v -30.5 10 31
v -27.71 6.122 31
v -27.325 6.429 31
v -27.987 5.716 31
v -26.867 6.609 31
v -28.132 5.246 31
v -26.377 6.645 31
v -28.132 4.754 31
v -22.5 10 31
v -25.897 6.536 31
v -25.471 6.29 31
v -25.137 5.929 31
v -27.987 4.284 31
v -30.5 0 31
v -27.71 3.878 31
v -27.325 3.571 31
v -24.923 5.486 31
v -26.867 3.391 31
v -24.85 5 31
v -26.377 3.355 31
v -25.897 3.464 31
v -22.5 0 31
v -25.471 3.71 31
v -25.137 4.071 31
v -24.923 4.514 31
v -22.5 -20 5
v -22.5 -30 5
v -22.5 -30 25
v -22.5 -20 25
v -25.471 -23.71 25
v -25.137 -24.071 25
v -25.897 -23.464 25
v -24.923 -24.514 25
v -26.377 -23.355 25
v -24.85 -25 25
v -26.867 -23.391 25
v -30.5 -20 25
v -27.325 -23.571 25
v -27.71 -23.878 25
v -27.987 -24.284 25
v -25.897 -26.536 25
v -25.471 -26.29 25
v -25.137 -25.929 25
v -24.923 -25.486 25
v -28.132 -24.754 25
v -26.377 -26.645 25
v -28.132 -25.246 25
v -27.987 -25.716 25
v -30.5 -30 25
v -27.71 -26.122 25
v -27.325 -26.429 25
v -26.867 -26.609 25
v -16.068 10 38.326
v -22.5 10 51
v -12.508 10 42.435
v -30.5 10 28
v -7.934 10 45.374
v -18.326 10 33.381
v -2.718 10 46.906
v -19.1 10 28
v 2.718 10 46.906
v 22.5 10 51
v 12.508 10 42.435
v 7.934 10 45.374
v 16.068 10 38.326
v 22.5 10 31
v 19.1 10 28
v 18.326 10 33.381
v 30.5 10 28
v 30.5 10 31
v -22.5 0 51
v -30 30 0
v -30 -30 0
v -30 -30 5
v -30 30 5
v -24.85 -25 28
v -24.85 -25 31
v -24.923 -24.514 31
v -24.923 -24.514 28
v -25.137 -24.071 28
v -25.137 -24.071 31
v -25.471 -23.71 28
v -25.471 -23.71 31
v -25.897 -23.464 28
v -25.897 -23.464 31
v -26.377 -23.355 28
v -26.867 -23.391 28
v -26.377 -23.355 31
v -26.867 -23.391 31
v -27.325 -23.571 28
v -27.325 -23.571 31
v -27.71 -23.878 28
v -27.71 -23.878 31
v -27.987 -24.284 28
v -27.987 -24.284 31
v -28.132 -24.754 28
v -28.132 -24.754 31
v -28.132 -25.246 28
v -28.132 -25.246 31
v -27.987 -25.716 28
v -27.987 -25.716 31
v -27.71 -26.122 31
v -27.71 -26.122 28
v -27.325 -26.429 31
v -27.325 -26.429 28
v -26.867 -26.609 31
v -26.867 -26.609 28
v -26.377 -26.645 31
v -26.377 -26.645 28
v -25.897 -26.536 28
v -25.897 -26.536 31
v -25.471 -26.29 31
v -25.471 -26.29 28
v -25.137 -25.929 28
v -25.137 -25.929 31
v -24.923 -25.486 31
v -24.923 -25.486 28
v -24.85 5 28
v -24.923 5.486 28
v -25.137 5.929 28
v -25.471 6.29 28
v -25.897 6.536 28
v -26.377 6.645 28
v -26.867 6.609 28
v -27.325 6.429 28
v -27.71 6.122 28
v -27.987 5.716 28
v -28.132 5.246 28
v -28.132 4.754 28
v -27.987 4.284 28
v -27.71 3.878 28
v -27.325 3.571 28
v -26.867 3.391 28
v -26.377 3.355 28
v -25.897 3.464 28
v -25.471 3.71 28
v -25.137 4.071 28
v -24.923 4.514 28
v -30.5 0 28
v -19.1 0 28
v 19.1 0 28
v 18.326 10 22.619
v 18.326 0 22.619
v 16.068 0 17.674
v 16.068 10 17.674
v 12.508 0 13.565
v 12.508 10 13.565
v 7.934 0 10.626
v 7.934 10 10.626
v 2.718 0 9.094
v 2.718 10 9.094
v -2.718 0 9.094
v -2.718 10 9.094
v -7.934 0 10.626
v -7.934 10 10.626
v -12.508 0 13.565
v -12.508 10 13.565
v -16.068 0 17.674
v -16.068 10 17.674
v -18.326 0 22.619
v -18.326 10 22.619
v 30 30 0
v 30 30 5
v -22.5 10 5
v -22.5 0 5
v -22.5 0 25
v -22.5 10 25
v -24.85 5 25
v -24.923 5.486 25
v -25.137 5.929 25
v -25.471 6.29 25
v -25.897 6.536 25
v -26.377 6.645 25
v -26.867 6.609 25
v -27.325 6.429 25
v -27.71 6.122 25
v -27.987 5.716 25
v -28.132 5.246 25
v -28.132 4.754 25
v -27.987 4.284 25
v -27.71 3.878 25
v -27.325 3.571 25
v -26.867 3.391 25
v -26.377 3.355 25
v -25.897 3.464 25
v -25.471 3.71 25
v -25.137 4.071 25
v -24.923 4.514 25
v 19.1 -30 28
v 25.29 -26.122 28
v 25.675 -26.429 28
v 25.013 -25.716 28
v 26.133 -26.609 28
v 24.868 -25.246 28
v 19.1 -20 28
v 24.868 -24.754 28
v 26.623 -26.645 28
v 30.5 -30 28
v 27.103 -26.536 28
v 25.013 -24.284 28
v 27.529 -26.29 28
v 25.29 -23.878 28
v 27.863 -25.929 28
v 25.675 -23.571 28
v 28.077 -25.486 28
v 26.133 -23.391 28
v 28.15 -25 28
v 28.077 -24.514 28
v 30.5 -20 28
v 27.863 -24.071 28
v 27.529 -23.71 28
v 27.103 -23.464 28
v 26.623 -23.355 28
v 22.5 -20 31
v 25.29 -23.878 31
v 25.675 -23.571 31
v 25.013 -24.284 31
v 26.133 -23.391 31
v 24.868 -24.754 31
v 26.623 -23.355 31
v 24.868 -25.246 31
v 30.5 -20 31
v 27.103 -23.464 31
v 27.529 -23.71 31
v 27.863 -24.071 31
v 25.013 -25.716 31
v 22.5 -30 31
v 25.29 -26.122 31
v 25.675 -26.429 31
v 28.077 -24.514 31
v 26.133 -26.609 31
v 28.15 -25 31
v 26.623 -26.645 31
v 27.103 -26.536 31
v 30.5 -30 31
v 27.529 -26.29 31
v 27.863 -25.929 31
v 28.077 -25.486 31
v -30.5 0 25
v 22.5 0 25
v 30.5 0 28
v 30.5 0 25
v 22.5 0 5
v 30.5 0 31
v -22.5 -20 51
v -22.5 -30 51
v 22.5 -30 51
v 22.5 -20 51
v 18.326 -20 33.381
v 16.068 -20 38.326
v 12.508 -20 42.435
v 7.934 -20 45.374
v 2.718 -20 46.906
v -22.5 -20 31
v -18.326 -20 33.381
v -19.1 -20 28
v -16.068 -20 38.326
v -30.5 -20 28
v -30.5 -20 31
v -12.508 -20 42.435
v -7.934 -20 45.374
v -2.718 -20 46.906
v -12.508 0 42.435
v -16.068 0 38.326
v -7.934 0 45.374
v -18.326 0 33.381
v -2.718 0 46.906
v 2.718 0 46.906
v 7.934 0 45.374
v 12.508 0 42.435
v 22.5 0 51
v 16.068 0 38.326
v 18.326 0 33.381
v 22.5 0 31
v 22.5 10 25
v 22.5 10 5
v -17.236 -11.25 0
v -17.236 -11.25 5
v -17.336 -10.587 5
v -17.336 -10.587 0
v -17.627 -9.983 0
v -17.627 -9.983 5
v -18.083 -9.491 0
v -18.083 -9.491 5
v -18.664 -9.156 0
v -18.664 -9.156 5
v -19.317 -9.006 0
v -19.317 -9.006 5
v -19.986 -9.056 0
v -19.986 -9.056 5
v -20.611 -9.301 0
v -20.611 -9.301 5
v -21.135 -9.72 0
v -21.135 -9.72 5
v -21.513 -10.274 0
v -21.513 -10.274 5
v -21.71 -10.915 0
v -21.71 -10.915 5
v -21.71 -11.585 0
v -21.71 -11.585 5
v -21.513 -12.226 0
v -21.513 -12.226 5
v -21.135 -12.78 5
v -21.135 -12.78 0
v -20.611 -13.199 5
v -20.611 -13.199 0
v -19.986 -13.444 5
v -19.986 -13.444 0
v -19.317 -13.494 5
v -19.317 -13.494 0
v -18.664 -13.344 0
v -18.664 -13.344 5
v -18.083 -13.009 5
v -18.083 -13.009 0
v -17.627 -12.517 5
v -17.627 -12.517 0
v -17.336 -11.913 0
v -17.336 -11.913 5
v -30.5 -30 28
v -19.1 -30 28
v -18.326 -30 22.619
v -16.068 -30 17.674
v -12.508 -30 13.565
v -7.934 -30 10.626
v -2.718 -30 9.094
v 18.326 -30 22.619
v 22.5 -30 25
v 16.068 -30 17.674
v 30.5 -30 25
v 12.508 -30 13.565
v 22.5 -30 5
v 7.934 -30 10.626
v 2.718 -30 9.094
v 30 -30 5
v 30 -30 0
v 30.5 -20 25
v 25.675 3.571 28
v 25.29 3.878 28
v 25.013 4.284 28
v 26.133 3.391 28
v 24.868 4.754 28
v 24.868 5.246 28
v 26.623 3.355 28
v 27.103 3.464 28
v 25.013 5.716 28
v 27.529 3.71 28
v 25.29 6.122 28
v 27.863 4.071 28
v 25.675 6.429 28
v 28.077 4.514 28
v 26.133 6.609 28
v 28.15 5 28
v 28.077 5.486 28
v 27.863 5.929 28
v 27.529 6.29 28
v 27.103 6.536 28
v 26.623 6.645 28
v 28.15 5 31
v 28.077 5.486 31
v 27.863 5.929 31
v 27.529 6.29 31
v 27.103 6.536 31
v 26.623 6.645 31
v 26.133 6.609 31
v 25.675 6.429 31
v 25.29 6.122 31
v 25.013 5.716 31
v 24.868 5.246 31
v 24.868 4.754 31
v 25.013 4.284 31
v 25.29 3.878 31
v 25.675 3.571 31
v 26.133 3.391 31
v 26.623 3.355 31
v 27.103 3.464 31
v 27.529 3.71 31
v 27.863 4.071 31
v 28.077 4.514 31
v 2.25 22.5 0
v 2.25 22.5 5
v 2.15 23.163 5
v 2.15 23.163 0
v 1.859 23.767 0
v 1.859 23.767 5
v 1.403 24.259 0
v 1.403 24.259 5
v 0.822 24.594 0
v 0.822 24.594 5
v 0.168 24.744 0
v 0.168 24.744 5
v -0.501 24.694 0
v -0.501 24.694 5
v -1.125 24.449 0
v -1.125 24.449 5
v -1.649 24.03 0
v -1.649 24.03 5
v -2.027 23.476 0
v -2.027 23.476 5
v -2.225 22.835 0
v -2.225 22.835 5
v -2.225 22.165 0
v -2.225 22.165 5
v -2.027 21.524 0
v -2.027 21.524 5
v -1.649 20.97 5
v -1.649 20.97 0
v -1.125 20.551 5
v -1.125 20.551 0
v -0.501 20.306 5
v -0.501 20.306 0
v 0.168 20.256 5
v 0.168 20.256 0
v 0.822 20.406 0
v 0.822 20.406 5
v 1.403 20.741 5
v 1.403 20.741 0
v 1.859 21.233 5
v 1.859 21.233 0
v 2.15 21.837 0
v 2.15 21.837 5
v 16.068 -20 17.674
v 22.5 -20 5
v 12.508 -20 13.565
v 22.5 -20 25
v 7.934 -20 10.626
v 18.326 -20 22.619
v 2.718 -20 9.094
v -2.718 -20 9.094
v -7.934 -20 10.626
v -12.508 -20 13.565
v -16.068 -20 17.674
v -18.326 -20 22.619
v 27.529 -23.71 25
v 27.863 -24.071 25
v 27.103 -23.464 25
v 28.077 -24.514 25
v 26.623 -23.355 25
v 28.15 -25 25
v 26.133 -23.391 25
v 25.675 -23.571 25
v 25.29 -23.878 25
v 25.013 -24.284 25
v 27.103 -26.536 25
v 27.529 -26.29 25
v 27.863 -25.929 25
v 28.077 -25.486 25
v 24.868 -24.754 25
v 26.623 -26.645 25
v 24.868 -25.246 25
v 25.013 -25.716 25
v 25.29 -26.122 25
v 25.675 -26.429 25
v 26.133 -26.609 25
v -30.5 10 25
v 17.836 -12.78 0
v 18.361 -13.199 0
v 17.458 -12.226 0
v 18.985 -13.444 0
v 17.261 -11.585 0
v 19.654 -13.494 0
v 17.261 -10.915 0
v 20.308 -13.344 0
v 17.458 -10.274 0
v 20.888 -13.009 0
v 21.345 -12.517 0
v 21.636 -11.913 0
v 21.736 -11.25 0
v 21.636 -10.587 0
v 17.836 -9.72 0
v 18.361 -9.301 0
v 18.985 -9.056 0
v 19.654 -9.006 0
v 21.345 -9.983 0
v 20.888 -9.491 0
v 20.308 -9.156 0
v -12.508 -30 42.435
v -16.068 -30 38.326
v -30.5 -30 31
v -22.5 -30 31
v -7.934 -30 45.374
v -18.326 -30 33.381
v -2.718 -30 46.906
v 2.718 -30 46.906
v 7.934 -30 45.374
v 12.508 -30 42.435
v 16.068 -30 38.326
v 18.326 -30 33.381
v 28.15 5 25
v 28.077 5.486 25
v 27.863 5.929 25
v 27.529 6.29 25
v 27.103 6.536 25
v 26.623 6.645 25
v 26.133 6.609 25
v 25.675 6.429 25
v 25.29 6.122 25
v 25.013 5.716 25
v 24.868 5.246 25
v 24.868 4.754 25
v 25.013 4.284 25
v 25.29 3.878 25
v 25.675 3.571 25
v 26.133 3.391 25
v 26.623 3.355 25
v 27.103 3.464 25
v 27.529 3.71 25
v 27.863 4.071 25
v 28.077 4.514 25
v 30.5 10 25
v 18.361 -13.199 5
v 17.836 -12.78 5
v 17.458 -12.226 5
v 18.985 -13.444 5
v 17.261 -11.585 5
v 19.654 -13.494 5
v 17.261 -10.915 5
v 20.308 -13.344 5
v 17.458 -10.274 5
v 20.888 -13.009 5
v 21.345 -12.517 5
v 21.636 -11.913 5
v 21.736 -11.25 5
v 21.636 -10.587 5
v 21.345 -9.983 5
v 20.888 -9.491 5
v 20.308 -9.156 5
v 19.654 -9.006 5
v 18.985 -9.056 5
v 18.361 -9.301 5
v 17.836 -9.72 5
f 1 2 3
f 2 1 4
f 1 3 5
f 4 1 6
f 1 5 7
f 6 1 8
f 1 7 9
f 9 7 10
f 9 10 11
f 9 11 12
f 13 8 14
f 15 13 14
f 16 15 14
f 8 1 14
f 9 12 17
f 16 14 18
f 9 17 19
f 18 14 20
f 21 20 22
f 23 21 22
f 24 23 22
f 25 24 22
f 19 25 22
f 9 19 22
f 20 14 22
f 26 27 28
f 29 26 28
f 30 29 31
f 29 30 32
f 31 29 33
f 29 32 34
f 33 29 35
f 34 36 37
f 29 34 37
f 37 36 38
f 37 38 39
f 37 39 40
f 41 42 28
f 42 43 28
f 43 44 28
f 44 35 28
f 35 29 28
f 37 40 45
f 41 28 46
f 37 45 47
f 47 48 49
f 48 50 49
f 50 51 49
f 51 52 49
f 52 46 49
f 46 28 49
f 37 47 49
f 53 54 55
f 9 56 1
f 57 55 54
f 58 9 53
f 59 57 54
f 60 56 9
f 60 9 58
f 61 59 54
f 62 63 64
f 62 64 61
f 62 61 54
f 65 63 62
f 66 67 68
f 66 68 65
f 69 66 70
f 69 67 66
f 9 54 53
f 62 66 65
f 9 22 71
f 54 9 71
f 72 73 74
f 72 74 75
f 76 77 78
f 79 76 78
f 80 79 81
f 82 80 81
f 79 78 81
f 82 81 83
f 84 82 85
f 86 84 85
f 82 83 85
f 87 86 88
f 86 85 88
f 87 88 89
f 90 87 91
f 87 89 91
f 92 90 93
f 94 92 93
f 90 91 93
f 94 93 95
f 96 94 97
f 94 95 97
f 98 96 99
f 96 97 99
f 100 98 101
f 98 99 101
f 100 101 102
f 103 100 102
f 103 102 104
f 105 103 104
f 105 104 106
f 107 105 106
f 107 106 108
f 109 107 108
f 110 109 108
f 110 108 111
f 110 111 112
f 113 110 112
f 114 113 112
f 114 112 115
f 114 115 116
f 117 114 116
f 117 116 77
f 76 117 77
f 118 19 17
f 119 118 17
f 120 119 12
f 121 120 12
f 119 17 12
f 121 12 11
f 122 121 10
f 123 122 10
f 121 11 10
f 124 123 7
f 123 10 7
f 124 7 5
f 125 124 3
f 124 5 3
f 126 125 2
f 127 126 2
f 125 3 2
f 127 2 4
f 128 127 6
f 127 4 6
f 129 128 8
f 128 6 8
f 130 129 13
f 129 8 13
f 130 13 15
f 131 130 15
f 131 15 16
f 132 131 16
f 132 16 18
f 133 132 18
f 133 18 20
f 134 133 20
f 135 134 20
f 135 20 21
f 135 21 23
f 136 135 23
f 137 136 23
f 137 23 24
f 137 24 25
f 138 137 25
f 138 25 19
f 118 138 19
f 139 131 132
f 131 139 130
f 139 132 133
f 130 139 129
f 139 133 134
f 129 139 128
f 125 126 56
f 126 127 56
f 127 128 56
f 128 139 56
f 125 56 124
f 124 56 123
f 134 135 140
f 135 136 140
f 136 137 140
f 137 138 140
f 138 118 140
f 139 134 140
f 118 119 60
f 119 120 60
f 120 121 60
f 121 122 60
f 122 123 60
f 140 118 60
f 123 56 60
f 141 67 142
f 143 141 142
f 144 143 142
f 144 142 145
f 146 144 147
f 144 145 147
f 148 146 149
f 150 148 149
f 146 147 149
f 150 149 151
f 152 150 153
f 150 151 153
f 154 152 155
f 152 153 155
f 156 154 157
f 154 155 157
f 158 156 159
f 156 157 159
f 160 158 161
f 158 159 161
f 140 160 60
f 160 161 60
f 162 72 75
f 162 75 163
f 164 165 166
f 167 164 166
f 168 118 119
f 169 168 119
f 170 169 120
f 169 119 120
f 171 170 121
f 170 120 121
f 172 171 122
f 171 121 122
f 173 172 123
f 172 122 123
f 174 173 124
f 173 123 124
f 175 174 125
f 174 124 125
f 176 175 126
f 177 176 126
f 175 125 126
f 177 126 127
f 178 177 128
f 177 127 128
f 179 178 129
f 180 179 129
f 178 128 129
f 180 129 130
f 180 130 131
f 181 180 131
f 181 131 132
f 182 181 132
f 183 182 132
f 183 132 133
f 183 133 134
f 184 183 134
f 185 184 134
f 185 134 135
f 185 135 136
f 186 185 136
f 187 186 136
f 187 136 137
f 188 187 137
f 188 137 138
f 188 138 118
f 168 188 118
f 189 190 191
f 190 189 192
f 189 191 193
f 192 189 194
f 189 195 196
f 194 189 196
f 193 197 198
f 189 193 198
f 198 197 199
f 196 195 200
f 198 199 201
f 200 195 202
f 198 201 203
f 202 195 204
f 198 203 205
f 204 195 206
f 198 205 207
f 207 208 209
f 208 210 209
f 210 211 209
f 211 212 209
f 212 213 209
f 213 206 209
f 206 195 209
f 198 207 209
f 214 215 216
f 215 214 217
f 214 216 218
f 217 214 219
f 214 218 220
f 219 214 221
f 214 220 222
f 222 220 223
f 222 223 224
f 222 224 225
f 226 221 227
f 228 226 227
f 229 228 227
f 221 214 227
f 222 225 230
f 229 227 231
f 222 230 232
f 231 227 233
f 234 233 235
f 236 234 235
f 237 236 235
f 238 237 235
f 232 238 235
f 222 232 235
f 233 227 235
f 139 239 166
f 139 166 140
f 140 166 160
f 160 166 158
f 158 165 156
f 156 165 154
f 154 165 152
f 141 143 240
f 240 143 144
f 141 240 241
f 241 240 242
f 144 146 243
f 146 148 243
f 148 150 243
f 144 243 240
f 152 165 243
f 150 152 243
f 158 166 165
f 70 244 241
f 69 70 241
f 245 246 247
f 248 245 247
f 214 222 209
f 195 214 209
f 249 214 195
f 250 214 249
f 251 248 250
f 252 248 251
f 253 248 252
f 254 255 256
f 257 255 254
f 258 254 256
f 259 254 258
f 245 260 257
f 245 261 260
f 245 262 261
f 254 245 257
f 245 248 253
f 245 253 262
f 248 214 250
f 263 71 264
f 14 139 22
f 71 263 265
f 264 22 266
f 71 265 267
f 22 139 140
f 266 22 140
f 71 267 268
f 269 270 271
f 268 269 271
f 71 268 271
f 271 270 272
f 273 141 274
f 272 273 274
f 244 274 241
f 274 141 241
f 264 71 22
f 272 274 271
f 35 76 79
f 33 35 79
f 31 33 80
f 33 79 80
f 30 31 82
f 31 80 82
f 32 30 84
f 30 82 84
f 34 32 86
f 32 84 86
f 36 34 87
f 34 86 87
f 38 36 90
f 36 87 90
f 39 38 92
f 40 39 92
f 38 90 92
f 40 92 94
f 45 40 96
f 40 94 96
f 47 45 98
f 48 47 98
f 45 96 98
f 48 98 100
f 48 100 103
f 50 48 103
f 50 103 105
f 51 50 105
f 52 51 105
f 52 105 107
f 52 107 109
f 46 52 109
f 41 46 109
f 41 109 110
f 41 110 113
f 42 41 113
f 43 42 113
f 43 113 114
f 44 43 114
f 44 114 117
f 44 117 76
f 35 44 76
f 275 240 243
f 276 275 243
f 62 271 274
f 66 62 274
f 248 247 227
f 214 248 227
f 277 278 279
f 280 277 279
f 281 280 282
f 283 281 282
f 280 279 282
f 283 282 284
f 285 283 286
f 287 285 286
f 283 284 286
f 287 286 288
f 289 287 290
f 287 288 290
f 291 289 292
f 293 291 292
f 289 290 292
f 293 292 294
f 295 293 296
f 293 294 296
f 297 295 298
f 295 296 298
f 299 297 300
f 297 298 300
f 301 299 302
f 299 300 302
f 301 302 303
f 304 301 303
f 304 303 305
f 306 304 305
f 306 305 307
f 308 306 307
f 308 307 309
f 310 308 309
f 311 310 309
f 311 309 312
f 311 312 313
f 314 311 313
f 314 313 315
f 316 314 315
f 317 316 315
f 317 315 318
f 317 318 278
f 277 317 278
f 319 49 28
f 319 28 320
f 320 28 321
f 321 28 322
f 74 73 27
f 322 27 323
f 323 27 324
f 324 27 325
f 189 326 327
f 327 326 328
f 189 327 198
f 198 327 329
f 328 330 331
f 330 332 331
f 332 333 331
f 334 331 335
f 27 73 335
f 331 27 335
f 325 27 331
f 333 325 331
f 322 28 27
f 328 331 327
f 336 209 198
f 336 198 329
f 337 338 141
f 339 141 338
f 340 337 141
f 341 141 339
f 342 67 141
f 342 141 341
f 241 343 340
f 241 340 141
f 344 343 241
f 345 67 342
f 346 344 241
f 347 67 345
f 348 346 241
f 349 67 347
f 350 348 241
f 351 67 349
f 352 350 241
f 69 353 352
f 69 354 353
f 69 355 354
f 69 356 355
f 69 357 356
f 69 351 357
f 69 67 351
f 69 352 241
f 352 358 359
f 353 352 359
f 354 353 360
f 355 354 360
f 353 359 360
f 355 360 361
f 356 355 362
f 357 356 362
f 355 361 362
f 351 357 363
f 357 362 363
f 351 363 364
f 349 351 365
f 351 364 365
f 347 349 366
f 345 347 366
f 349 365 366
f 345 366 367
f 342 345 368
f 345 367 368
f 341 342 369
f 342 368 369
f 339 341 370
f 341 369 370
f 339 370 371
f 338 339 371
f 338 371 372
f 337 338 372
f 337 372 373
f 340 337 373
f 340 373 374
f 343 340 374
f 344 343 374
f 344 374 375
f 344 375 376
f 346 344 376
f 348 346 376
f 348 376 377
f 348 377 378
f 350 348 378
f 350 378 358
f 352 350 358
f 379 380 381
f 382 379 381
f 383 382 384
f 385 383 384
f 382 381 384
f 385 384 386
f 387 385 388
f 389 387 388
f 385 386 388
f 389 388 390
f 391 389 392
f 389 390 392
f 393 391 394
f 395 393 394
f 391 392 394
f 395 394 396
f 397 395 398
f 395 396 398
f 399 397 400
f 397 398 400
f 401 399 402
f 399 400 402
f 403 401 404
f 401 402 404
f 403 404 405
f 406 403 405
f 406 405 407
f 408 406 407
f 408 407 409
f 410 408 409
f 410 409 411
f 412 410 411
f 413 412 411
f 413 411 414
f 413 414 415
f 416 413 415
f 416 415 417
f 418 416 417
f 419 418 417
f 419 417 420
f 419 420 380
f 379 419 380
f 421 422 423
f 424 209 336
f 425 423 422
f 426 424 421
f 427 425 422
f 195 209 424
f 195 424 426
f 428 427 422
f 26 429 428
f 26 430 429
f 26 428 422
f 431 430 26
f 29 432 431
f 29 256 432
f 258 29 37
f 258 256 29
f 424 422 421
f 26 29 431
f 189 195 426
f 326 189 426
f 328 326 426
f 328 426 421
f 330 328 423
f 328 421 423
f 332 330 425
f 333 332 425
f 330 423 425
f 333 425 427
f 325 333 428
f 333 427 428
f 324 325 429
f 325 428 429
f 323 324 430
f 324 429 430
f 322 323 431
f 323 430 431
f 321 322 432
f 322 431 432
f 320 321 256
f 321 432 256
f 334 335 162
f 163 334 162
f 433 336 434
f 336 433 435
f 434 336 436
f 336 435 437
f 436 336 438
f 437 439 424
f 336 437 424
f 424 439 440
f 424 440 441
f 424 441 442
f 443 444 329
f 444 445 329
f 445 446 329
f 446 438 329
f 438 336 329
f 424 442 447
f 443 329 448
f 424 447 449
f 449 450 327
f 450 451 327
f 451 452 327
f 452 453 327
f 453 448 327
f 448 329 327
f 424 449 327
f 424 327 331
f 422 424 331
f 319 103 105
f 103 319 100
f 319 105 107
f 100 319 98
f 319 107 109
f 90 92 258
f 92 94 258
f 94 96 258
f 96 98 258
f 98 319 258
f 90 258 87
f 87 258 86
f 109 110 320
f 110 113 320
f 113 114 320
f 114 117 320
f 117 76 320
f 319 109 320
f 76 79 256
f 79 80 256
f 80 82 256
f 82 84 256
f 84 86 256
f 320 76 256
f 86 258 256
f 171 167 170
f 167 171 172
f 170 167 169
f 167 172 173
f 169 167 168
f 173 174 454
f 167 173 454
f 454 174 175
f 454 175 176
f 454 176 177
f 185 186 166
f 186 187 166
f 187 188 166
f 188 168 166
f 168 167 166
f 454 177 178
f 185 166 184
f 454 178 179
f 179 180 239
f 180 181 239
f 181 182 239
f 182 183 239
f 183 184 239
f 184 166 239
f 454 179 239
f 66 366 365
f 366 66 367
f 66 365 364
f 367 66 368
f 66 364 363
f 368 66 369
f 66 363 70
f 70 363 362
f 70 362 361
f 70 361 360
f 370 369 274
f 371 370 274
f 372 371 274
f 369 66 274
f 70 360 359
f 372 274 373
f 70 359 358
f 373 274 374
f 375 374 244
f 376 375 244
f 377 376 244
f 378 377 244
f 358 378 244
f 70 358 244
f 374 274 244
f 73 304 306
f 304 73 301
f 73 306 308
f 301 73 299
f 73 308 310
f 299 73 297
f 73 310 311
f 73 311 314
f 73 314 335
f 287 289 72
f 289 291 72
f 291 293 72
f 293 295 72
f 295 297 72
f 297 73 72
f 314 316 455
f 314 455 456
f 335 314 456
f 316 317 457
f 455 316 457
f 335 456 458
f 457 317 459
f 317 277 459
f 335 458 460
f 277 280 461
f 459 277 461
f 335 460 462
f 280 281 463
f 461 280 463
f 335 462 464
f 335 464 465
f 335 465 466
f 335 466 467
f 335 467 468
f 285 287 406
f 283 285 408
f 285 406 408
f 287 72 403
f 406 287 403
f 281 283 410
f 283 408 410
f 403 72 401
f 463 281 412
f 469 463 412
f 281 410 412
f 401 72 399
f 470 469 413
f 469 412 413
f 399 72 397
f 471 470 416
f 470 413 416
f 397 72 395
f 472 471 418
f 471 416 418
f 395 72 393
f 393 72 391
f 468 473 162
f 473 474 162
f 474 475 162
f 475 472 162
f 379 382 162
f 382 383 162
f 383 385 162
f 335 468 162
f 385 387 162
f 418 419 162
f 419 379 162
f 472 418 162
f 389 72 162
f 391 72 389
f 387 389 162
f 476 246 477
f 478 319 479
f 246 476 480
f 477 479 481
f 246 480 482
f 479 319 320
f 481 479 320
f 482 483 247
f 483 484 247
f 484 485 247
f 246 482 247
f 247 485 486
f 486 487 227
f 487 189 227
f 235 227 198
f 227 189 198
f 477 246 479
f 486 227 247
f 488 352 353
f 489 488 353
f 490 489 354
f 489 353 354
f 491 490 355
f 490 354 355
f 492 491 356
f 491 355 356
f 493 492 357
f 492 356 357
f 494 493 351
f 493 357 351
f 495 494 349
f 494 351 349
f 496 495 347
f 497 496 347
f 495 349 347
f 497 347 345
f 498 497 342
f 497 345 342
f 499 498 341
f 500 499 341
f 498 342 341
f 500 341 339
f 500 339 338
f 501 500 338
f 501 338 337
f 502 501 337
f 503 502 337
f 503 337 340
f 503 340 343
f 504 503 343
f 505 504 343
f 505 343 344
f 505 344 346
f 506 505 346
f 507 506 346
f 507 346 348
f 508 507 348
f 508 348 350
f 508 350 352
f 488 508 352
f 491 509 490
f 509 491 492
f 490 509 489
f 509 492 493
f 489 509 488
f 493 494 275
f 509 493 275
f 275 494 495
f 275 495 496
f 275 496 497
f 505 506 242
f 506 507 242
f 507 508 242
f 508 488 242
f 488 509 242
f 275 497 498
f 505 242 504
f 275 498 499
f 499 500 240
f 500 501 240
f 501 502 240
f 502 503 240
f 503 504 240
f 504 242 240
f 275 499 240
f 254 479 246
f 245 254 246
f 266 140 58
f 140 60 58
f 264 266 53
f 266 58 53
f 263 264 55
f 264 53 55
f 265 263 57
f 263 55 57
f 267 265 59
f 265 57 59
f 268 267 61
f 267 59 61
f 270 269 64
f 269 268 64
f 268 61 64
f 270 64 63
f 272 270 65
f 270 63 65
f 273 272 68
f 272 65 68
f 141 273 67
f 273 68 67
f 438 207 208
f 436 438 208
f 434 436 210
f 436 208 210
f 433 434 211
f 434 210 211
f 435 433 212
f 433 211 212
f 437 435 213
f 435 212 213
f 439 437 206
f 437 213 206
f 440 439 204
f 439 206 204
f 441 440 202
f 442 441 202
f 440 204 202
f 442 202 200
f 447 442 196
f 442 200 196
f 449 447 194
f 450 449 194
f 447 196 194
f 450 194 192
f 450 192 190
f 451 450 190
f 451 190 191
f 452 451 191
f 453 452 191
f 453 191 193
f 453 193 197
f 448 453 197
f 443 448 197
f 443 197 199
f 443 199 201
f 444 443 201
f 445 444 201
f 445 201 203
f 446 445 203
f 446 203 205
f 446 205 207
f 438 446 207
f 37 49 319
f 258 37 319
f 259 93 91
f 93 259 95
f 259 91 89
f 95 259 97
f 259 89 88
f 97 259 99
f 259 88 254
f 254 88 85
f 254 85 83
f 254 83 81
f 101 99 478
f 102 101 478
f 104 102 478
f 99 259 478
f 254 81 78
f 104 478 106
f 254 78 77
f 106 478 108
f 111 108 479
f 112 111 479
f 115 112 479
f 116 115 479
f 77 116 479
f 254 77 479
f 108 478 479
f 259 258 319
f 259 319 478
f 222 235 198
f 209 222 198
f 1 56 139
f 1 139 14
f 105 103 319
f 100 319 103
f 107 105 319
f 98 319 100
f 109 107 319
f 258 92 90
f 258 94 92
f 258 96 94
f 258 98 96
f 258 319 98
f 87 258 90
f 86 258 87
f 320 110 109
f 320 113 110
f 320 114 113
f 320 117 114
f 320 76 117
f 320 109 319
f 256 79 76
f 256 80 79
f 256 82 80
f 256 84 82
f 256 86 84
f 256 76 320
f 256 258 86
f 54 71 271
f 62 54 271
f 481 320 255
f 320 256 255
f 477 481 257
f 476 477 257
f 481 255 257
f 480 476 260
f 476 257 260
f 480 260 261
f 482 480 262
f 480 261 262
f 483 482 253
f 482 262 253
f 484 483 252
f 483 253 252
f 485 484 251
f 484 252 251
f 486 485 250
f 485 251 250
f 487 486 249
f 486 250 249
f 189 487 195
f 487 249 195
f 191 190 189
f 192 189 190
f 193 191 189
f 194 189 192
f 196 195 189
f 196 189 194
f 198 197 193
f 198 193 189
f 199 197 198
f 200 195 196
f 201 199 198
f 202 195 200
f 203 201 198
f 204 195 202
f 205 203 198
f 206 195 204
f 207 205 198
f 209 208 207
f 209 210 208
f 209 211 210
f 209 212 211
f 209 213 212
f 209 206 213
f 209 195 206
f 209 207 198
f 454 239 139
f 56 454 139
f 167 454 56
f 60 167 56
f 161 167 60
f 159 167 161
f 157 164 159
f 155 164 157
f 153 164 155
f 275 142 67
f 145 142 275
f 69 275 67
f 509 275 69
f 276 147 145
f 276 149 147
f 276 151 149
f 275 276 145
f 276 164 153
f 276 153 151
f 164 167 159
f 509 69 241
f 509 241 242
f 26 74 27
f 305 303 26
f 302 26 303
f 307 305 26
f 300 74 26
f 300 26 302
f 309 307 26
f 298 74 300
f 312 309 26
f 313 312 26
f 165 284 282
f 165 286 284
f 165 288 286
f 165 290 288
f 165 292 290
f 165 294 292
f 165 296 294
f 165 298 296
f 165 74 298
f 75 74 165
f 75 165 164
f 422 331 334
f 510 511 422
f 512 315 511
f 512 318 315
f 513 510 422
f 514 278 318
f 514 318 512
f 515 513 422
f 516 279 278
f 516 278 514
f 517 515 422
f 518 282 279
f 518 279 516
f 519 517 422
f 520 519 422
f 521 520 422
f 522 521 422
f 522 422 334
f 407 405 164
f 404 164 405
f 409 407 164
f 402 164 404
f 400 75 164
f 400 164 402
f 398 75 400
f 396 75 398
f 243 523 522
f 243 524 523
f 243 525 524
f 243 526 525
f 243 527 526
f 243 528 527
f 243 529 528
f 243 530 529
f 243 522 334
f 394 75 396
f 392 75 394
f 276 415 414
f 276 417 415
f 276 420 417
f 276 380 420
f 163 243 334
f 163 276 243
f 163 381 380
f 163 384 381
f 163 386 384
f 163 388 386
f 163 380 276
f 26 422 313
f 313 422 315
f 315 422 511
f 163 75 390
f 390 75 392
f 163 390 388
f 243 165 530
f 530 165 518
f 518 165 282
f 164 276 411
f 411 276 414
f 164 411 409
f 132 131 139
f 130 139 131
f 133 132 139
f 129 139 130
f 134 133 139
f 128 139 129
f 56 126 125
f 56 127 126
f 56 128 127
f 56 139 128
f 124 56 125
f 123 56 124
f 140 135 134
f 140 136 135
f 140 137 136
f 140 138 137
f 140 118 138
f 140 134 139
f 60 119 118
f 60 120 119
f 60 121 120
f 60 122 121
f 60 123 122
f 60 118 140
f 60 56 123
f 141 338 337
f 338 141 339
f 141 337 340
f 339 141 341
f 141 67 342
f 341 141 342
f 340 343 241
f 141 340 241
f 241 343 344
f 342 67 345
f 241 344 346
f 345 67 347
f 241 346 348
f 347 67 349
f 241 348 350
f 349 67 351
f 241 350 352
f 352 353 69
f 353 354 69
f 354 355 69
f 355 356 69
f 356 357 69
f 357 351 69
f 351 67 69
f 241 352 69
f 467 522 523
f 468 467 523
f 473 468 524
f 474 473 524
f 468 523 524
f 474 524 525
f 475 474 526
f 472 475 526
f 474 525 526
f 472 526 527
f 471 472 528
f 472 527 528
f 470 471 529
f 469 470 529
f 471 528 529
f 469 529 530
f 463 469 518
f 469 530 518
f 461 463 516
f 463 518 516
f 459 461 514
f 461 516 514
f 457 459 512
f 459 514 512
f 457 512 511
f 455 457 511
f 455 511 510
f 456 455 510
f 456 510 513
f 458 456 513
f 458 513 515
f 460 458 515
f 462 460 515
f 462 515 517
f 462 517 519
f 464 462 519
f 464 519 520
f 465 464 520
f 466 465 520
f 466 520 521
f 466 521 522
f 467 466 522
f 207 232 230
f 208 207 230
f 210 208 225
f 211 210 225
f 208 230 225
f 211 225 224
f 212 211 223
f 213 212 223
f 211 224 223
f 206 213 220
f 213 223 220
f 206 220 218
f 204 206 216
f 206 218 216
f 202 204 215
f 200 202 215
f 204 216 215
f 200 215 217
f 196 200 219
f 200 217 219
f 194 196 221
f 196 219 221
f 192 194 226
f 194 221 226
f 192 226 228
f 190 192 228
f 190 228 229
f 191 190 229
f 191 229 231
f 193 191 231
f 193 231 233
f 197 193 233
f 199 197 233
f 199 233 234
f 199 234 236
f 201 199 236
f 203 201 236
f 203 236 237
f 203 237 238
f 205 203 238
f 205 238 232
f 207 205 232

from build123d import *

# Parameters (mm, degrees)
SKETCH_1_W          = 60
SKETCH_1_H          = 60
EXTRUDE_1_DEPTH     = 5
SKETCH_2_R          = 2.25
CUT_EXTRUDE_1_DEPTH = 43.720018727
EXTRUDE_2_DEPTH     = 10
EXTRUDE_3_DEPTH     = 10
SKETCH_5_R          = 19.1
CUT_EXTRUDE_2_DEPTH = 72.632743909
CUT_EXTRUDE_3_REACH = 54.832
SKETCH_7_R          = 1.65


with BuildPart() as part:
    # ｽｹｯﾁ1 → ﾎﾞｽ - 押し出し1 (new body)
    with BuildSketch(Plane.XY):
        Rectangle(SKETCH_1_W, SKETCH_1_H)
    extrude(amount=EXTRUDE_1_DEPTH)

    # ｽｹｯﾁ2 → ｶｯﾄ - 押し出し1 (cut, through all)
    with BuildSketch(Plane.XY.offset(5)):
        with Locations((0, 22.5)):
            Circle(SKETCH_2_R)
        with Locations((19.485571585, -11.25)):
            Circle(SKETCH_2_R)
        with Locations((-19.485571585, -11.25)):
            Circle(SKETCH_2_R)
    extrude(amount=-CUT_EXTRUDE_1_DEPTH, mode=Mode.SUBTRACT)

    # ｽｹｯﾁ3 → ﾎﾞｽ - 押し出し2 (add)
    with BuildSketch(Plane.XZ.offset(30)):
        Polygon((22.5, 5), (-22.5, 5), (-22.5, 25), (-30.5, 25), (-30.5, 31), (-22.5, 31), (-22.5, 51), (22.5, 51), (22.5, 31), (30.5, 31), (30.5, 25), (22.5, 25), align=None)
    extrude(amount=-EXTRUDE_2_DEPTH)

    # ｽｹｯﾁ4 → ﾎﾞｽ - 押し出し3 (add)
    with BuildSketch(Plane(origin=(0, 0, 0), x_dir=(1, 0, 0), z_dir=(0, 1, 0))):
        Polygon((-22.5, -51), (22.5, -51), (22.5, -31), (30.5, -31), (30.5, -25), (22.5, -25), (22.5, -5), (-22.5, -5), (-22.5, -25), (-30.5, -25), (-30.5, -31), (-22.5, -31), align=None)
    extrude(amount=EXTRUDE_3_DEPTH)

    # ｽｹｯﾁ5 → ｶｯﾄ - 押し出し2 (cut, through all)
    with BuildSketch(Plane(origin=(0, 10, 0), x_dir=(1, 0, 0), z_dir=(0, 1, 0))):
        with Locations(Location((0, -28, 0), (0, 0, 270))):
            Circle(SKETCH_5_R)
    extrude(amount=-CUT_EXTRUDE_2_DEPTH, mode=Mode.SUBTRACT)

    # ｽｹｯﾁ7 → ｶｯﾄ - 押し出し3 (cut, up to next)
    with BuildSketch(Plane.XY.offset(31), mode=Mode.PRIVATE) as cut_extrude_3_sk1:
        with Locations((-26.5, 5)):
            Circle(SKETCH_7_R)
    cut_extrude_3_tool1 = extrude(cut_extrude_3_sk1.sketch, amount=-CUT_EXTRUDE_3_REACH, mode=Mode.PRIVATE) & part.part
    # ｽｹｯﾁ7 → ｶｯﾄ - 押し出し3 (cut, up to next)
    with BuildSketch(Plane.XY.offset(31), mode=Mode.PRIVATE) as cut_extrude_3_sk2:
        with Locations((26.5, 5)):
            Circle(SKETCH_7_R)
    cut_extrude_3_tool2 = extrude(cut_extrude_3_sk2.sketch, amount=-CUT_EXTRUDE_3_REACH, mode=Mode.PRIVATE) & part.part
    # ｽｹｯﾁ7 → ｶｯﾄ - 押し出し3 (cut, up to next)
    with BuildSketch(Plane.XY.offset(31), mode=Mode.PRIVATE) as cut_extrude_3_sk3:
        with Locations((26.5, -25)):
            Circle(SKETCH_7_R)
    cut_extrude_3_tool3 = extrude(cut_extrude_3_sk3.sketch, amount=-CUT_EXTRUDE_3_REACH, mode=Mode.PRIVATE) & part.part
    # ｽｹｯﾁ7 → ｶｯﾄ - 押し出し3 (cut, up to next)
    with BuildSketch(Plane.XY.offset(31), mode=Mode.PRIVATE) as cut_extrude_3_sk4:
        with Locations((-26.5, -25)):
            Circle(SKETCH_7_R)
    cut_extrude_3_tool4 = extrude(cut_extrude_3_sk4.sketch, amount=-CUT_EXTRUDE_3_REACH, mode=Mode.PRIVATE) & part.part
    add(cut_extrude_3_tool1.solids().sort_by_distance((-26.5, 5, 31))[0], mode=Mode.SUBTRACT)
    add(cut_extrude_3_tool2.solids().sort_by_distance((26.5, 5, 31))[0], mode=Mode.SUBTRACT)
    add(cut_extrude_3_tool3.solids().sort_by_distance((26.5, -25, 31))[0], mode=Mode.SUBTRACT)
    add(cut_extrude_3_tool4.solids().sort_by_distance((-26.5, -25, 31))[0], mode=Mode.SUBTRACT)


with BuildPart() as body_2:
    # Split Bodies 1: the piece on the far side of the plane
    add(part.part)
    split(bisect_by=Plane.XY.offset(28), keep=Keep.BOTTOM)


with BuildPart() as part_1:
    add(part.part)

    # Split Bodies 1
    split(bisect_by=Plane.XY.offset(28), keep=Keep.TOP)


solid = Compound([body_2.part, part_1.part])
